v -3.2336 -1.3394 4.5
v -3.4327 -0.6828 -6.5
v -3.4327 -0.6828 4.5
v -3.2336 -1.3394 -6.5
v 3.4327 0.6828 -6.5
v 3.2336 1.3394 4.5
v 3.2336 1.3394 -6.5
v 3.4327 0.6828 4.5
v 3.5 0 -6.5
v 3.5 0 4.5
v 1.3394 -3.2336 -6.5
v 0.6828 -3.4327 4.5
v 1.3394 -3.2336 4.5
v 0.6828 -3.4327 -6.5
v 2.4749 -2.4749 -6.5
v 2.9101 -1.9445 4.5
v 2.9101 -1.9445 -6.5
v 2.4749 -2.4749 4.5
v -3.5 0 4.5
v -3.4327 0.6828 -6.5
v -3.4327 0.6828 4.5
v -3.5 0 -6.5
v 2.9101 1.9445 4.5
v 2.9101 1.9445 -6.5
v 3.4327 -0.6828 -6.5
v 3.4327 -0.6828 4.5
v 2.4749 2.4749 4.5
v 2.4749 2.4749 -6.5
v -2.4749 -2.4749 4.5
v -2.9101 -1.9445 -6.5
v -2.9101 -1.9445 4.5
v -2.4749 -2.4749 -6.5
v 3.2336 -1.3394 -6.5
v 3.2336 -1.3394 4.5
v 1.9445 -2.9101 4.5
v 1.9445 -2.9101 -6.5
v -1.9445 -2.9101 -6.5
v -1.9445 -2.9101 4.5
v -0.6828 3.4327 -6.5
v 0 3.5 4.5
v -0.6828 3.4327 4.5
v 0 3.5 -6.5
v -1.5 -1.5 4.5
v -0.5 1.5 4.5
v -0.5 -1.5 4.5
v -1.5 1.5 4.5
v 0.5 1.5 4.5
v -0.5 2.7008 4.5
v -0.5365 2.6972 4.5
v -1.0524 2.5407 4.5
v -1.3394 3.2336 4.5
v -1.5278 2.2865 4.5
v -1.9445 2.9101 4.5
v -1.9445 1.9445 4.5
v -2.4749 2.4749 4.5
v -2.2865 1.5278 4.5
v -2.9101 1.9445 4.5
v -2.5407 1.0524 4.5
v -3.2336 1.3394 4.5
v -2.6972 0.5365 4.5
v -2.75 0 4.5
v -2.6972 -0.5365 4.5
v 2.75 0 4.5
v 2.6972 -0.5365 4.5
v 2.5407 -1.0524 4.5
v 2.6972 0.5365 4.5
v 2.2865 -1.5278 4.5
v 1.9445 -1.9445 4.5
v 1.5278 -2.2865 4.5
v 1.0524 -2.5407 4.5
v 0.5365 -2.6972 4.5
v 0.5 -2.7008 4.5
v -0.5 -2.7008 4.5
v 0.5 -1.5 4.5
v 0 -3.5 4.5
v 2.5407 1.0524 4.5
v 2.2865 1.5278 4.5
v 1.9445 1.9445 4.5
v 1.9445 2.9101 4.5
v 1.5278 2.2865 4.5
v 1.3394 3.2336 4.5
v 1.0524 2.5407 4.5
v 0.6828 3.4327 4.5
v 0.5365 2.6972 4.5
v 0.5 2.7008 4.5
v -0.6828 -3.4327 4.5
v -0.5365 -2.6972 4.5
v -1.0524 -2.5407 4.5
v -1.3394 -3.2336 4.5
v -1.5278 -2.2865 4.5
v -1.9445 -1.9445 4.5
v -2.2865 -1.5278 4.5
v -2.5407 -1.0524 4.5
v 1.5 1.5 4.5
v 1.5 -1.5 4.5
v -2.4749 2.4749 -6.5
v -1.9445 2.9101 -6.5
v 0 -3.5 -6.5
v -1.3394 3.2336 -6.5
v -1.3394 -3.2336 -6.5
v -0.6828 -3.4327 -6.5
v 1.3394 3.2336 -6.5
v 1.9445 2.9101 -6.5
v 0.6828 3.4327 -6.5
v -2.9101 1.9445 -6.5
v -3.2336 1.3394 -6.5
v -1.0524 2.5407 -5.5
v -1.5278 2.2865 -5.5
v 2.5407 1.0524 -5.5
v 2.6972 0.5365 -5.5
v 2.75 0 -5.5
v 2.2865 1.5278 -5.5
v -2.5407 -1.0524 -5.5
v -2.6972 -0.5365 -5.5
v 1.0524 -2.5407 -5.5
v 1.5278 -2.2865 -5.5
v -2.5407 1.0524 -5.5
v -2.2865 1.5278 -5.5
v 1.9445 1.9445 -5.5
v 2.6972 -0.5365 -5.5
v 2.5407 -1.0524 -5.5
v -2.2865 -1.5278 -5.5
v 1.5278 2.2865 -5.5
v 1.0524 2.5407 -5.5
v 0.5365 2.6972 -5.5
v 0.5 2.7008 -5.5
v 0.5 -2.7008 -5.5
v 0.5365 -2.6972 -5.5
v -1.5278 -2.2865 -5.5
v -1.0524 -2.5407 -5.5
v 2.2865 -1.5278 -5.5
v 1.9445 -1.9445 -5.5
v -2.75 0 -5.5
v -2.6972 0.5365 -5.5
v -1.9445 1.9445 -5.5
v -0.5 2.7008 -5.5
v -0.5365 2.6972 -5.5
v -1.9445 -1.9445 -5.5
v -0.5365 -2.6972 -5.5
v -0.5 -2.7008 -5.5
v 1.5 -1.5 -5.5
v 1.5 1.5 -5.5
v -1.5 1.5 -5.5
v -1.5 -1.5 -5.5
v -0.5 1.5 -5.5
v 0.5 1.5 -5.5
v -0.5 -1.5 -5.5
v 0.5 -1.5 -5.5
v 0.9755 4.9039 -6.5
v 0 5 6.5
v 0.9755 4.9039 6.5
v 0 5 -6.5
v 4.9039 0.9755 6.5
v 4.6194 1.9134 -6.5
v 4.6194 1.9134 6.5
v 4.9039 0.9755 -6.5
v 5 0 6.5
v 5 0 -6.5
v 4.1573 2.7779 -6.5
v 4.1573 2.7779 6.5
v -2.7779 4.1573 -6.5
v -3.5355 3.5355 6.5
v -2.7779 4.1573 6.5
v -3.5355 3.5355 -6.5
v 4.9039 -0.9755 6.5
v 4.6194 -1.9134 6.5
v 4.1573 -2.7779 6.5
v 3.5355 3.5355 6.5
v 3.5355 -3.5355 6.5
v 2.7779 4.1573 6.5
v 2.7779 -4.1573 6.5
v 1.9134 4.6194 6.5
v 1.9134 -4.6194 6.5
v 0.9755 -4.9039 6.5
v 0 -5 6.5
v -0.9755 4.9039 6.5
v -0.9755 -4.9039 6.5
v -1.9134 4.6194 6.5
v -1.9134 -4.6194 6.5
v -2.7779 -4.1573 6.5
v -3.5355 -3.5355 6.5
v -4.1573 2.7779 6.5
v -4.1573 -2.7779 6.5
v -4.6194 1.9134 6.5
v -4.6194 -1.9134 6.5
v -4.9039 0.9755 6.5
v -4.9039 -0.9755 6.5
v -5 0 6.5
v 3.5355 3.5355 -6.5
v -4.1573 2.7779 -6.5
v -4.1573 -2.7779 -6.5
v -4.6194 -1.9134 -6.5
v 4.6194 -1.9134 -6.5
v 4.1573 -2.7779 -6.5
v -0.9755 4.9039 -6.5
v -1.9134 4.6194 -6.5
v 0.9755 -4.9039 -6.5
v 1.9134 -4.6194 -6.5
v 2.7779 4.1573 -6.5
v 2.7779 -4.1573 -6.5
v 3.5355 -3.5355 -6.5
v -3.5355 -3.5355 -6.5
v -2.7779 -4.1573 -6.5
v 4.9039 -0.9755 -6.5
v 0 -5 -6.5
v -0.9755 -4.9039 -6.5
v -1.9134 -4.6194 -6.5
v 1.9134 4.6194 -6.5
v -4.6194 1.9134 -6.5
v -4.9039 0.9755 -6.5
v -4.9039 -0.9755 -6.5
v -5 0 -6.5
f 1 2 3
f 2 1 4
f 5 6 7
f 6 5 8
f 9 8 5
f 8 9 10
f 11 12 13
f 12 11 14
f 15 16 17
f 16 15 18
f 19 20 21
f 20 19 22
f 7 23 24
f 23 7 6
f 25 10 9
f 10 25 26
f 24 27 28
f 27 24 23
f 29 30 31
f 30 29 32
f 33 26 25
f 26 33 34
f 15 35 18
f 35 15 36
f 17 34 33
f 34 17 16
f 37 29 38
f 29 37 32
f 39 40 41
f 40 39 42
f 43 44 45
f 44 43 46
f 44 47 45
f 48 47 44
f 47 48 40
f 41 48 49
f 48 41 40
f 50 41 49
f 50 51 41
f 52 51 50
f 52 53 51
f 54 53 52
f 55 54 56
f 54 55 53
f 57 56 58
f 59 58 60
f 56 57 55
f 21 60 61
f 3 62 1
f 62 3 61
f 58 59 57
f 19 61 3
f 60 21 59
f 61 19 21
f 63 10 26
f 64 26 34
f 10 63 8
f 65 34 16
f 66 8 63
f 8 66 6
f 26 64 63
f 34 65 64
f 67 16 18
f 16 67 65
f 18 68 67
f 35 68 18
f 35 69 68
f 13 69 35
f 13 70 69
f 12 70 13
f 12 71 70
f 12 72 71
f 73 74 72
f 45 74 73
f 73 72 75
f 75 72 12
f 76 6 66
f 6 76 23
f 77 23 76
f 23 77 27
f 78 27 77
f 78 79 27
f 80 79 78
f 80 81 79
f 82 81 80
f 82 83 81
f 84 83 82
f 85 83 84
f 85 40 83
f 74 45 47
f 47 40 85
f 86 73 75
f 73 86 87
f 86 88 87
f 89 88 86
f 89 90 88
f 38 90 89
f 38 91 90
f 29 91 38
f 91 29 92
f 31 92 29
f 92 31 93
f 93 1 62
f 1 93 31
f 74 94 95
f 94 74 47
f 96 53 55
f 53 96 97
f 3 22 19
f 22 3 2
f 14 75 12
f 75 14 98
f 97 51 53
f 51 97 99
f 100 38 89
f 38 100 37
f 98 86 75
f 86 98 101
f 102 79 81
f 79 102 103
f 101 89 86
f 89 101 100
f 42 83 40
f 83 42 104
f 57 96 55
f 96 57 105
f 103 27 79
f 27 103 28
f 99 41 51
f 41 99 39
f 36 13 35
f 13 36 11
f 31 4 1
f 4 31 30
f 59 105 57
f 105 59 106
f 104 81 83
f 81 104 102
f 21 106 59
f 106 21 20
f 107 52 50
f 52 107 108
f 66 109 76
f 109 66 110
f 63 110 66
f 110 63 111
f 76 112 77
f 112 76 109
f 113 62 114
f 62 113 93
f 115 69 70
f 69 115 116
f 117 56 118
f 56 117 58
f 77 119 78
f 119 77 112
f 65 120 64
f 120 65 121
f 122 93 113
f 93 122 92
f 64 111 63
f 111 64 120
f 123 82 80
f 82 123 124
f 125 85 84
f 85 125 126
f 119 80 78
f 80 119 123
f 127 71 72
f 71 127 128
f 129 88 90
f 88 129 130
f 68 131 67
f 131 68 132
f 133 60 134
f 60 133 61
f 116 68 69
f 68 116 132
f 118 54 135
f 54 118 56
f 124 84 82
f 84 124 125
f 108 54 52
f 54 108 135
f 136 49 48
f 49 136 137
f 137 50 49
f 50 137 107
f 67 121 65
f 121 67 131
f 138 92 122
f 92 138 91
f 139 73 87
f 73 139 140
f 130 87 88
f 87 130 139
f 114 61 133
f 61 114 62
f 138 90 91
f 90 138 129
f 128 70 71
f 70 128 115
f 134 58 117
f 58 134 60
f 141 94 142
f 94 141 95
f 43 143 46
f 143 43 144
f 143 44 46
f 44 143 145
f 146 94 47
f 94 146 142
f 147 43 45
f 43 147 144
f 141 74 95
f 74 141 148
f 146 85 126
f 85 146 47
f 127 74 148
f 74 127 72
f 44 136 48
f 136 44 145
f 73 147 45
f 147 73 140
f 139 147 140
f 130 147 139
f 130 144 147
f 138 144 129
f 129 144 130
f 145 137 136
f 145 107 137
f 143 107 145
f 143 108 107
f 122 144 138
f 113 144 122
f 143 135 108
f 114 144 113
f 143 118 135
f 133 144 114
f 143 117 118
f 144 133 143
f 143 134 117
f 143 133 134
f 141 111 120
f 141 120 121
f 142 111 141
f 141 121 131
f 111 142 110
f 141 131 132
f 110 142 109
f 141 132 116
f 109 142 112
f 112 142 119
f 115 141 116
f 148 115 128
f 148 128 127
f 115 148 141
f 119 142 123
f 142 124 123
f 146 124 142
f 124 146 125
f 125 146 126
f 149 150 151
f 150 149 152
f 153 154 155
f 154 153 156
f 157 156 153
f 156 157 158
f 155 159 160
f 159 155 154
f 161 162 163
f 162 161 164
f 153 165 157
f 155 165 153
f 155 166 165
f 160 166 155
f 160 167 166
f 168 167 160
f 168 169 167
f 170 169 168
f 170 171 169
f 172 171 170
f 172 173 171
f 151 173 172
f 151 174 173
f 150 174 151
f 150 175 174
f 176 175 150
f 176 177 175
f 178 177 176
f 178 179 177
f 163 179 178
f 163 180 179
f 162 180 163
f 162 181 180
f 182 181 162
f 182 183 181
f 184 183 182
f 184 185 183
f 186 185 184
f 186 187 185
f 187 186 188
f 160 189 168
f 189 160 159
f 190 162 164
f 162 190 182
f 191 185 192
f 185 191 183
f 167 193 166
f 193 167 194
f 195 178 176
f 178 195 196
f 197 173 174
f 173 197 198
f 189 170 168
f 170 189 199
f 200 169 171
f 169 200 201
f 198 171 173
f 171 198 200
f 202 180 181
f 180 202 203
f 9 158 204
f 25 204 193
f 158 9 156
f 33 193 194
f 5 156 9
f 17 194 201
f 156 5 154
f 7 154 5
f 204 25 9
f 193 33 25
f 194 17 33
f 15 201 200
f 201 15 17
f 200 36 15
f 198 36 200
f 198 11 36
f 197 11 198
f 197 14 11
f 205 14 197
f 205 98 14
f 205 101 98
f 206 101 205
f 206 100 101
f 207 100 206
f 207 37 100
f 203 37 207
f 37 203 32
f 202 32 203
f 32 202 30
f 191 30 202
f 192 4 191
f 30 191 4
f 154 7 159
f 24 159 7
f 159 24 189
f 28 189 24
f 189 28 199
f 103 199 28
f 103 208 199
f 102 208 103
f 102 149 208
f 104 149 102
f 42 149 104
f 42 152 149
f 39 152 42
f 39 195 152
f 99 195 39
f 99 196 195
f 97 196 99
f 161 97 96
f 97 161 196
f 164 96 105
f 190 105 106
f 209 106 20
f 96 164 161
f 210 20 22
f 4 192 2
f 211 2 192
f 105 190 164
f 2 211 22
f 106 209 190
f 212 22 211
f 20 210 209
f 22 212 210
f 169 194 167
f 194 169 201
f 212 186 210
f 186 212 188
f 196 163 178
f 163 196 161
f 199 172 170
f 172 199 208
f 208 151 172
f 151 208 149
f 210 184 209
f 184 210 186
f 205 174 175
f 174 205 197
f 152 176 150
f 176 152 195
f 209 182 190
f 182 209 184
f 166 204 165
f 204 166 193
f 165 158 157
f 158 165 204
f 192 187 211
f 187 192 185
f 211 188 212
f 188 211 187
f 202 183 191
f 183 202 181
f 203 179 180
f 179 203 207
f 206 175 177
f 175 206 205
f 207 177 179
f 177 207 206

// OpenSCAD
$fn= 32;



difference() {
cylinder(r=5, h=13, center=true);
translate([0,0,-2]) {
    cube(size=[3, 3, 13], center=true);
    cube(size=[1, 6, 13], center=true);
    difference() {
        cylinder(r=3.5, h=13, center=true);
        cylinder(r=2.75, h=13, center=true);
    }
    translate([0,0,-10])cylinder(r=3.5, h=13, center=true);
}

}
